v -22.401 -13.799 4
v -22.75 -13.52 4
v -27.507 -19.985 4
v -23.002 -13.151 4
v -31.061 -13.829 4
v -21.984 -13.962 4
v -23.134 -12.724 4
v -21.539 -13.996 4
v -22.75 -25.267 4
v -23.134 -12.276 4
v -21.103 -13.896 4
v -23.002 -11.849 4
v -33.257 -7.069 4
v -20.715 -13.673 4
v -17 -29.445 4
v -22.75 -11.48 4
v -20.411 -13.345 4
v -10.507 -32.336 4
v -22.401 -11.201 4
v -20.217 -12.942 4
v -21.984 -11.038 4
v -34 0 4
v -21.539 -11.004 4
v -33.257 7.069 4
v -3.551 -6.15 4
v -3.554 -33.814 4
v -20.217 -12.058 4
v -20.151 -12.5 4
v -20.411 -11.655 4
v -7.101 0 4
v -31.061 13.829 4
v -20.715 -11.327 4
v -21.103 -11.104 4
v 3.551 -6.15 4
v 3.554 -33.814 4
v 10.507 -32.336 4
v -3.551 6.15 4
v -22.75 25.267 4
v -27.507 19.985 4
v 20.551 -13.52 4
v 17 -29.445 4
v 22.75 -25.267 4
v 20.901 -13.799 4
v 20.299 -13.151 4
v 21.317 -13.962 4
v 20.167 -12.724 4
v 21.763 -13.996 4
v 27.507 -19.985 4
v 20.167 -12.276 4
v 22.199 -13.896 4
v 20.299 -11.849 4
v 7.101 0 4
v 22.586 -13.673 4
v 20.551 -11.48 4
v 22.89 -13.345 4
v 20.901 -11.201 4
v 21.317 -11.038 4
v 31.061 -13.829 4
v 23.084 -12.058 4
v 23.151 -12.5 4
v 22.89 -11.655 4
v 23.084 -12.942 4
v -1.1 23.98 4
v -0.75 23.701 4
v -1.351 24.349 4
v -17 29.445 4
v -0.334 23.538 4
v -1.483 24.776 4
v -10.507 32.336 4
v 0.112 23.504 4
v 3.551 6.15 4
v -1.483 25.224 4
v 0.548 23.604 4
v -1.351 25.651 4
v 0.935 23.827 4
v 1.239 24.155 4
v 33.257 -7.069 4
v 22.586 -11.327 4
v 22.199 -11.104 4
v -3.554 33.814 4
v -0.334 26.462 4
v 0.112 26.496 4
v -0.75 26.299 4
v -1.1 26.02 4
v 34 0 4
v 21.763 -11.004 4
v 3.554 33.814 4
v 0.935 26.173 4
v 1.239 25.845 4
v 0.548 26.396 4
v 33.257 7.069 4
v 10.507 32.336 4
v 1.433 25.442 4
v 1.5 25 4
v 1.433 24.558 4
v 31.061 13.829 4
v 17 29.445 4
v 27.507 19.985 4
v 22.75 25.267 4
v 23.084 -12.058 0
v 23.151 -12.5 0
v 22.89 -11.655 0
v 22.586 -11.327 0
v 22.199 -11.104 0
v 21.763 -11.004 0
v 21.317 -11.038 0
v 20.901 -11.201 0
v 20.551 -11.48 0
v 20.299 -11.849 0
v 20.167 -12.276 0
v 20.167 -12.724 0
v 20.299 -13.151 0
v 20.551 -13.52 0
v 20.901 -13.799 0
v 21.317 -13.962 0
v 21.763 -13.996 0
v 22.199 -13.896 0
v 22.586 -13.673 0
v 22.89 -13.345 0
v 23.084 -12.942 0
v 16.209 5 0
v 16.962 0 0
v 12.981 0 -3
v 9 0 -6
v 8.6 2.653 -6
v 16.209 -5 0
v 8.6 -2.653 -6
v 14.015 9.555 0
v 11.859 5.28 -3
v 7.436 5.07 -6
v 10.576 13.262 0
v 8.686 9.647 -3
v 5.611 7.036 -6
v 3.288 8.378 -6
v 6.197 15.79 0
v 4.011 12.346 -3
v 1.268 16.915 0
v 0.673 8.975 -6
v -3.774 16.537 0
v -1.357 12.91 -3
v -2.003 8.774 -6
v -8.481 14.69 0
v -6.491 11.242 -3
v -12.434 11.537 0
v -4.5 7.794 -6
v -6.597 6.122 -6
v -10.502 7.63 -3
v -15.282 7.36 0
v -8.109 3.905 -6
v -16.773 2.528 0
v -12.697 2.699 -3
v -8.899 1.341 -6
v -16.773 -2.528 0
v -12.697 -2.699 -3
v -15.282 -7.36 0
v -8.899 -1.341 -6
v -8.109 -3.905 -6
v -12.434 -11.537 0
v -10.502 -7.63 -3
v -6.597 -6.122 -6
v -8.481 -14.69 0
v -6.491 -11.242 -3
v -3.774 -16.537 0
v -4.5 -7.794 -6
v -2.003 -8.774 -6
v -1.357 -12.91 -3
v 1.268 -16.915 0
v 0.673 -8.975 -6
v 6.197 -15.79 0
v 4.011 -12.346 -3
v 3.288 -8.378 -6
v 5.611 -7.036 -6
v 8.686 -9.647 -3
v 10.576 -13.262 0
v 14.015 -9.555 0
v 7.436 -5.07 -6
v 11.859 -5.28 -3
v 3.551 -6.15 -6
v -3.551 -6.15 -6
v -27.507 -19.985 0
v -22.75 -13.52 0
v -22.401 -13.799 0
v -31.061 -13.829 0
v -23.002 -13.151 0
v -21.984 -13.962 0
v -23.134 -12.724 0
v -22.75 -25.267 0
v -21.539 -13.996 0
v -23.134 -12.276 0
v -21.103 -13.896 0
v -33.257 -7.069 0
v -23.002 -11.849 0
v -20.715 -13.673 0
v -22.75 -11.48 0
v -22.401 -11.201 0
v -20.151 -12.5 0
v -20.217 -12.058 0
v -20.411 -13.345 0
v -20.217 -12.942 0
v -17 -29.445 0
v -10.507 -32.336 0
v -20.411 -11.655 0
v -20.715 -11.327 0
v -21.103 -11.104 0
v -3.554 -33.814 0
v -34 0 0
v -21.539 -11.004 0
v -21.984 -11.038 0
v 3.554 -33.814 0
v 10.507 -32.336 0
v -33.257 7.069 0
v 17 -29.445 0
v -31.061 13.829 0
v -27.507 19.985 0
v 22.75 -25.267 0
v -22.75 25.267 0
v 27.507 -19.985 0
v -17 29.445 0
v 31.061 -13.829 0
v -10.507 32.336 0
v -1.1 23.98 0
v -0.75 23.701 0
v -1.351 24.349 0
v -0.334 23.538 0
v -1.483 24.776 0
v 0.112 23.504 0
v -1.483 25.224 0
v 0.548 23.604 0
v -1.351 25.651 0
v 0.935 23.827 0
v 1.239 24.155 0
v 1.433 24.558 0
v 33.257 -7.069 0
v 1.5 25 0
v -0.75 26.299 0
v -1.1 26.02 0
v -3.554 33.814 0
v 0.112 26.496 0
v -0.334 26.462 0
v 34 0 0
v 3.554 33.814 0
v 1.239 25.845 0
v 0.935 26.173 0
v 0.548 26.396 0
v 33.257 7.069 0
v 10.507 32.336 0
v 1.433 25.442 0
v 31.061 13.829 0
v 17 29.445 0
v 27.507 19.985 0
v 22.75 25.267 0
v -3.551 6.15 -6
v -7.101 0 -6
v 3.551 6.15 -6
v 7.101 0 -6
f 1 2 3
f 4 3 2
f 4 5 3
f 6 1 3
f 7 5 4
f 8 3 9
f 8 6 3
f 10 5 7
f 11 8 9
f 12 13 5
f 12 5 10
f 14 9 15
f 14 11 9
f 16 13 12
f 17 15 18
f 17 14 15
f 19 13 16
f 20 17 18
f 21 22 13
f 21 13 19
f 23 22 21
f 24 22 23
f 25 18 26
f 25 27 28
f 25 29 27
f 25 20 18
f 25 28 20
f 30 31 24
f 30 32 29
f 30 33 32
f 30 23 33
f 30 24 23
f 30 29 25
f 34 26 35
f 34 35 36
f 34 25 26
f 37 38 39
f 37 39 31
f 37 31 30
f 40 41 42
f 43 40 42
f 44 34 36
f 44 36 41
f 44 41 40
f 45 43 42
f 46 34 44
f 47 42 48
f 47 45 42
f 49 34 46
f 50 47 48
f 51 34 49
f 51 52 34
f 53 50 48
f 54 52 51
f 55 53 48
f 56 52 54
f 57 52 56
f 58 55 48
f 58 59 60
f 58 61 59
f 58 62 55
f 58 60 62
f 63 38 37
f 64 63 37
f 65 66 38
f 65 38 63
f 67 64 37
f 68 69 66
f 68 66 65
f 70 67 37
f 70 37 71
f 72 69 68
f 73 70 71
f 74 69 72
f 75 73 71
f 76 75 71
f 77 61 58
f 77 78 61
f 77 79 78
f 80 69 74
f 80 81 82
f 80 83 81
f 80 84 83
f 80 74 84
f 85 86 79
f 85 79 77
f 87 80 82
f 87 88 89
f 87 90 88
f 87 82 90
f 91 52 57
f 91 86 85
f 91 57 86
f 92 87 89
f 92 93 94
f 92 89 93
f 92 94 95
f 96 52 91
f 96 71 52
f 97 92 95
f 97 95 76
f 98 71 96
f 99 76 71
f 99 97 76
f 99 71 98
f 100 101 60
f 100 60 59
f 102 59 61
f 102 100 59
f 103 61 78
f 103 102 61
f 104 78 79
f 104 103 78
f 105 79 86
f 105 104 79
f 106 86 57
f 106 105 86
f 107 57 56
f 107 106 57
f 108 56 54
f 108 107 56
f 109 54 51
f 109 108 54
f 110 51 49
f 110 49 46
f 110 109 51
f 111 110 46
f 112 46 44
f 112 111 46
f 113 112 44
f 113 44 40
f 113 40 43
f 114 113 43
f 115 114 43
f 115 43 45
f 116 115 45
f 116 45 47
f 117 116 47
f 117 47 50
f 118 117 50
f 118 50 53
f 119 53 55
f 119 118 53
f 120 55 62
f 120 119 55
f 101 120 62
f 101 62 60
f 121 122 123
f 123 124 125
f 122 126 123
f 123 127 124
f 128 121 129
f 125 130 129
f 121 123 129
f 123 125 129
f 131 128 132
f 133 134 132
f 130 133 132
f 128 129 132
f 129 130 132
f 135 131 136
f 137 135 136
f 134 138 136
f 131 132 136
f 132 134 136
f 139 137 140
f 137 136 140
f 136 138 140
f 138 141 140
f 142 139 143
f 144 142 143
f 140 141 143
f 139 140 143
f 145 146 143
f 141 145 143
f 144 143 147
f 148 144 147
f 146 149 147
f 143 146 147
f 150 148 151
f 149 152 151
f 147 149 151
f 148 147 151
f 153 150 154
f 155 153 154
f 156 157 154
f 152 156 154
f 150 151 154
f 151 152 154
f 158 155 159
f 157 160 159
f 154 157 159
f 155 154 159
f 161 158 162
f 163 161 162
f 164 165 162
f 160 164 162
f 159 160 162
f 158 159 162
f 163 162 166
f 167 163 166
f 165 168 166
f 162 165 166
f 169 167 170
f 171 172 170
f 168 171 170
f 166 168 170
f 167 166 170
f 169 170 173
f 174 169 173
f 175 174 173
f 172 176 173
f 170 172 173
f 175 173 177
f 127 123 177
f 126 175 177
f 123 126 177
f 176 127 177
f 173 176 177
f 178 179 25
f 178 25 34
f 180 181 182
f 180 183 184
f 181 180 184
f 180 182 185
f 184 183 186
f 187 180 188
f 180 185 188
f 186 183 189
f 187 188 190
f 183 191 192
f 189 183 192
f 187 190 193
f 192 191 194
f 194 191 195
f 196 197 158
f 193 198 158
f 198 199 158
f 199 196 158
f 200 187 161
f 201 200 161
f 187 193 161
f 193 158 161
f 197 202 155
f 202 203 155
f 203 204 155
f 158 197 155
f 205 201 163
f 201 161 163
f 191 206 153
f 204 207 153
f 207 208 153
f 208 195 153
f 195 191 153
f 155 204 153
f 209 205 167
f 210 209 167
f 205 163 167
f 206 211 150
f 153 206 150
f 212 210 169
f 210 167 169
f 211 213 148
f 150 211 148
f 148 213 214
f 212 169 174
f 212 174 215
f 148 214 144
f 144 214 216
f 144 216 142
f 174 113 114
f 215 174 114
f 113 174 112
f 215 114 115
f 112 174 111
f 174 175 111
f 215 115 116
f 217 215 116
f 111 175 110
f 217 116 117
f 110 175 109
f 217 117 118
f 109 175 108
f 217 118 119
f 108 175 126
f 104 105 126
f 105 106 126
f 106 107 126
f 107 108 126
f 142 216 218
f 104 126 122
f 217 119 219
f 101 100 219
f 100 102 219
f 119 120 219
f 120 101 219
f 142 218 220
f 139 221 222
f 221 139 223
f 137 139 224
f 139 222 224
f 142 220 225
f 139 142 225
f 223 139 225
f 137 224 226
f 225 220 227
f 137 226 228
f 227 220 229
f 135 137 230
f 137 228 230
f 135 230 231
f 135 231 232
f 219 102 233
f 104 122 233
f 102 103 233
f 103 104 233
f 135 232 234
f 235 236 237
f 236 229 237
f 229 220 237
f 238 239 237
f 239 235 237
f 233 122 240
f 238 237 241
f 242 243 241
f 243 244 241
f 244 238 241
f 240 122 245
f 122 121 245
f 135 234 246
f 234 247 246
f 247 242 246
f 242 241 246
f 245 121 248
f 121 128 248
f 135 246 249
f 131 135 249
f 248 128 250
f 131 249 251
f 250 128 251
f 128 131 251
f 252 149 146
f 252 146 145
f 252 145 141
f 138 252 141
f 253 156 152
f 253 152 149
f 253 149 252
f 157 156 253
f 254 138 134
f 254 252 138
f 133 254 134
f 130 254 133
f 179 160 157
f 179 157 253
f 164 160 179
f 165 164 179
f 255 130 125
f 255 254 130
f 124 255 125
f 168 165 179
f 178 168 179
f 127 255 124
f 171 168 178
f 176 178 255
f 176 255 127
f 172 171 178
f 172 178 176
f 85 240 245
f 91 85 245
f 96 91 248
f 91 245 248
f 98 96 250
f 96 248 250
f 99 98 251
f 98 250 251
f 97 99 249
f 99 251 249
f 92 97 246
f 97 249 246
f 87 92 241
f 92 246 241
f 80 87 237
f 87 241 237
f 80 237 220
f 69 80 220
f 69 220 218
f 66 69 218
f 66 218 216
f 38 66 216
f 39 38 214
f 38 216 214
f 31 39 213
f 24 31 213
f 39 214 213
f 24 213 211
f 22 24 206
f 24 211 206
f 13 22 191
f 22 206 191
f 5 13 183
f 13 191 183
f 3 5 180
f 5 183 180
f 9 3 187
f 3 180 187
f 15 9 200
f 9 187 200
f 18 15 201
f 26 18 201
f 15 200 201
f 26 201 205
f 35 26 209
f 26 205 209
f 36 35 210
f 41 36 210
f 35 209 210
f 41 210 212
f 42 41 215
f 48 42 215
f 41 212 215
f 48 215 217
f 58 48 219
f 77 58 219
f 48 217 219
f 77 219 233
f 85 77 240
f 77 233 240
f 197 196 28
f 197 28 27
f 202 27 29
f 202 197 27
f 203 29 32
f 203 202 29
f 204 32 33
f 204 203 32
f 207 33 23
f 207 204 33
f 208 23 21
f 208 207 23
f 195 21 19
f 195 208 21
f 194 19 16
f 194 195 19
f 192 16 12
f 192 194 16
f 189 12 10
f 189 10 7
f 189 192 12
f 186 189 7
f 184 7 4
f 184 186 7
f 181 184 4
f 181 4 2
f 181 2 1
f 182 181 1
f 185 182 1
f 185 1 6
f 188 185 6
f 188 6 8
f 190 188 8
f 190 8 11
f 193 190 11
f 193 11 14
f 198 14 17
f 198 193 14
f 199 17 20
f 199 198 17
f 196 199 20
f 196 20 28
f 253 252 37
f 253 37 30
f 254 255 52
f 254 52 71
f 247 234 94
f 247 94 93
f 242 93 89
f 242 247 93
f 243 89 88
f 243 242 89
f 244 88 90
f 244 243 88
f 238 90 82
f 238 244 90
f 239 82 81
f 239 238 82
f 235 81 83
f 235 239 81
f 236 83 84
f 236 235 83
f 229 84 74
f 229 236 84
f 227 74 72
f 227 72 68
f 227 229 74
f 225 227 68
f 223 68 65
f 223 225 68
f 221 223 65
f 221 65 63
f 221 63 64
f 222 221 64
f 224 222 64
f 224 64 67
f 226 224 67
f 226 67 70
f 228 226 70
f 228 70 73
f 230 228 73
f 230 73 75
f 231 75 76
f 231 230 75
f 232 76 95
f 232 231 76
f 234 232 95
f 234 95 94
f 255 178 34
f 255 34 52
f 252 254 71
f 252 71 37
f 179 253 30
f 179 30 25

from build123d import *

# Parameters (mm, degrees)
CROQUIS1_R              = 34
CROQUIS1_R_2            = 1.5
SALIENTE_EXTRUIR1_DEPTH = 4
CORTAR_EXTRUIR1_DEPTH   = 4
SALIENTE_EXTRUIR2_START = 6
CROQUIS3_R              = 9
CROQUIS3_R_2            = 1.5
SALIENTE_EXTRUIR2_DEPTH = 6


with BuildPart() as part:
    # Croquis1 → Saliente-Extruir1 (new body)
    with BuildSketch(Plane.XY):
        Circle(CROQUIS1_R)
        with Locations((0, 25)):
            Circle(CROQUIS1_R_2, mode=Mode.SUBTRACT)
        with Locations((21.650635095, -12.5)):
            Circle(CROQUIS1_R_2, mode=Mode.SUBTRACT)
        with Locations((-21.650635095, -12.5)):
            Circle(CROQUIS1_R_2, mode=Mode.SUBTRACT)
    extrude(amount=SALIENTE_EXTRUIR1_DEPTH)

    # Croquis2 → Cortar-Extruir1 (cut)
    with BuildSketch(Plane(origin=(0, 0, 0), x_dir=(-1, 0, 0), z_dir=(0, 0, -1))):
        Polygon((3.550704156, 6.15), (-3.550704156, 6.15), (-7.101408311, 0), (-3.550704156, -6.15), (3.550704156, -6.15), (7.101408311, 0), align=None)
    extrude(amount=-CORTAR_EXTRUIR1_DEPTH, mode=Mode.SUBTRACT)

    # Croquis3 → Saliente-Extruir2 (add)
    # profile 1 of 4: a face of its own
    with BuildSketch(Plane(origin=(0, 0, 0), x_dir=(-1, 0, 0), z_dir=(0, 0, -1)).offset(SALIENTE_EXTRUIR2_START)):
        with Locations(Location((0, 0, 0), (0, 0, 180))):
            Circle(CROQUIS3_R)
        Polygon((-7.101408311, 0), (-3.550704156, 6.15), (3.550704156, 6.15), (7.101408311, 0), (3.550704156, -6.15), (-3.550704156, -6.15), align=None, mode=Mode.SUBTRACT)
    # profile 2 of 4: a face of its own
    with BuildSketch(Plane(origin=(0, 0, 0), x_dir=(-1, 0, 0), z_dir=(0, 0, -1)).offset(SALIENTE_EXTRUIR2_START)):
        with Locations(Location((0, 25, 0), (0, 0, 180))):
            Circle(CROQUIS3_R_2)
    # profile 3 of 4: a face of its own
    with BuildSketch(Plane(origin=(0, 0, 0), x_dir=(-1, 0, 0), z_dir=(0, 0, -1)).offset(SALIENTE_EXTRUIR2_START)):
        with Locations(Location((-21.650635095, -12.5, 0), (0, 0, 180))):
            Circle(CROQUIS3_R_2)
    # profile 4 of 4: a face of its own
    with BuildSketch(Plane(origin=(0, 0, 0), x_dir=(-1, 0, 0), z_dir=(0, 0, -1)).offset(SALIENTE_EXTRUIR2_START)):
        with Locations(Location((21.650635095, -12.5, 0), (0, 0, 180))):
            Circle(CROQUIS3_R_2)
    extrude(amount=-SALIENTE_EXTRUIR2_DEPTH)


with BuildPart() as saliente_extruir2_kept_piece:
    # of the separate pieces the step leaves, the one the design keeps (saliente_extruir2_pieces_kept)
    add(part.part.solids().sort_by_distance((34, 0, 0))[0])

    # Croquis4 → Revolución1 (revolve)
    with BuildSketch(Plane(origin=(0, 0, 0), x_dir=(1, 0, 0), z_dir=(0, 1, 0))):
        Polygon((9, 6), (9, 0), (16.96226893, 0), align=None)
    revolve(axis=Axis((0, 0, -12.759887465), (0, 0, 1)))


solid = saliente_extruir2_kept_piece.part
